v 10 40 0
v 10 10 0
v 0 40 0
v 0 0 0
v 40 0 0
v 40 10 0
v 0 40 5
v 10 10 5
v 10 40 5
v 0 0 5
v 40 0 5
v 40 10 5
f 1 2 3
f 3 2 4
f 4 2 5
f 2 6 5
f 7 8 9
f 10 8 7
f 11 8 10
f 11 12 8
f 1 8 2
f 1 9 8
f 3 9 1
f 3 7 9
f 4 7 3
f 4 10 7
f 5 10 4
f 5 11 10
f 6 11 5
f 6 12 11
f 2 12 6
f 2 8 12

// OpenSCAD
$fn = 80;

linear_extrude(height=5)
difference() {

    square([40,40]);

    translate([10,10])
        square([30,30]);

    // adiciona o filete
    translate([10,10])
        intersection() {
            circle(r=10);
            square([10,10]);
        }
}
